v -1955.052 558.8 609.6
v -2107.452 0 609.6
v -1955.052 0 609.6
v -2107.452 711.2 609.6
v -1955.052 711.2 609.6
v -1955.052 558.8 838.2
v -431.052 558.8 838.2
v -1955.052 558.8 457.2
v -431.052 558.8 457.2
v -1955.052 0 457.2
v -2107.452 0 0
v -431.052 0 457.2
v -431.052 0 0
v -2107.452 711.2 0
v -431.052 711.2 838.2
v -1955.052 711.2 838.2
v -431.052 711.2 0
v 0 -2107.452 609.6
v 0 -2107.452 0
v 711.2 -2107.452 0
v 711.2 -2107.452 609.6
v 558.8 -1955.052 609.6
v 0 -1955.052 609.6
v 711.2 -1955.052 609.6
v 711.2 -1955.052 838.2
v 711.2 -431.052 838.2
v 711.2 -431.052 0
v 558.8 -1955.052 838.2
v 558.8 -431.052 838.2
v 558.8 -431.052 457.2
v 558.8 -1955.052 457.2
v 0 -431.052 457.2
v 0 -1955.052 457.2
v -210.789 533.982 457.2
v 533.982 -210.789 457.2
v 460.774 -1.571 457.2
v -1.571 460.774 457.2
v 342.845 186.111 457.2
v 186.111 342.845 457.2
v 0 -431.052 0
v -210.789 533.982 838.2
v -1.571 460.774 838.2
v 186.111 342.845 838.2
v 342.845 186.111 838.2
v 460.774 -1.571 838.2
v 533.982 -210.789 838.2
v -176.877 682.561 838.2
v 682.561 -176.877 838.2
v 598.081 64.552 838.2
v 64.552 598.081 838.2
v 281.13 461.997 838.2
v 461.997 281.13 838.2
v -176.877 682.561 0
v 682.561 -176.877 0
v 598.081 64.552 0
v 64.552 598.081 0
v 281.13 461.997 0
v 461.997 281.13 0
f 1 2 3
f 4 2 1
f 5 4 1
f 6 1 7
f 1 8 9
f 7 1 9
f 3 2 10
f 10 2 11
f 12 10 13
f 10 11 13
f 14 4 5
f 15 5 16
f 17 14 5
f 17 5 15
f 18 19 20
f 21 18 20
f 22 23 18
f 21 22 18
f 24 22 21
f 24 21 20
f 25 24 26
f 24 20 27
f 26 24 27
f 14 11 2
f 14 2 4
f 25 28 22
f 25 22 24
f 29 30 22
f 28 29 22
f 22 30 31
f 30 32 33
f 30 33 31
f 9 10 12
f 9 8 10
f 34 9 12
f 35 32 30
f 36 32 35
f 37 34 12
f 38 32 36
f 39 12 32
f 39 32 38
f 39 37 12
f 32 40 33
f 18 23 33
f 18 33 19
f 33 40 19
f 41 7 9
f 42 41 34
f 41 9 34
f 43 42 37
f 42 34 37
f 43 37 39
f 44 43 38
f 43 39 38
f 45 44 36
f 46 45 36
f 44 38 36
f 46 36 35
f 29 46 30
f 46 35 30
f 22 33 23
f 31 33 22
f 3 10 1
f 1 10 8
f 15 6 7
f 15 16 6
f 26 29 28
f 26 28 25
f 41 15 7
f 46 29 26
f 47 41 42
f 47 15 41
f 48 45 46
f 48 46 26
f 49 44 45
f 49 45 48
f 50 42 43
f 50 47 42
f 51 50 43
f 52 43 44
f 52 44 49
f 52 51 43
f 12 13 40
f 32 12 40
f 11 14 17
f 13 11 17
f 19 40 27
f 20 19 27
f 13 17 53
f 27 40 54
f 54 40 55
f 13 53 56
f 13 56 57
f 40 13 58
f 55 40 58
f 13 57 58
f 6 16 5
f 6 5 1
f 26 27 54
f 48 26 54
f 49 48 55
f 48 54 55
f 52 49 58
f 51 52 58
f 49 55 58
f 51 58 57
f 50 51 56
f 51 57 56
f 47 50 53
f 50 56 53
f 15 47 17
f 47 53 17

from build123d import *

# Parameters (mm, degrees)
F1_DEPTH = 457.2
F3_DEPTH = 838.2
F4_W     = 152.4
F4_H     = 711.2
F4_W_2   = 711.2
F4_H_2   = 152.4
F5_DEPTH = 609.6


with BuildPart() as f1:
    # F0 (on Top) → F1 (new body)
    with BuildSketch(Plane.XY):
        with BuildLine():
            Line((-1955.052294, 0), (-431.052294, 0))
            Line((-431.052294, 0), (0, -431.052294))
            Line((0, -431.052294), (0, -1955.052294))
            Line((0, -1955.052294), (558.8, -1955.052294))
            Line((558.8, -1955.052294), (558.8, -431.052294))
            ThreePointArc((558.8, -431.052294), (268.878976, 268.878976), (-431.052294, 558.8))
            Line((-431.052294, 558.8), (-1955.052294, 558.8))
            Line((-1955.052294, 558.8), (-1955.052294, 0))
        make_face()
    extrude(amount=F1_DEPTH)

    # F2 (on Top) → F3 (join)
    with BuildSketch(Plane.XY):
        with BuildLine():
            Line((-1955.052294, 558.8), (-431.052294, 558.8))
            ThreePointArc((-431.052294, 558.8), (268.878976, 268.878976), (558.8, -431.052294))
            Line((558.8, -431.052294), (558.8, -1955.052294))
            Line((558.8, -1955.052294), (711.2, -1955.052294))
            Line((711.2, -1955.052294), (711.2, -431.052294))
            ThreePointArc((711.2, -431.052294), (376.642049, 376.642049), (-431.052294, 711.2))
            Line((-431.052294, 711.2), (-1955.052294, 711.2))
            Line((-1955.052294, 711.2), (-1955.052294, 558.8))
        make_face()
    extrude(amount=F3_DEPTH)

    # F4 (on Top) → F5 (join)
    with BuildSketch(Plane.XY):
        with Locations((-2031.252294, 355.6)):
            Rectangle(F4_W, F4_H)
        with Locations((355.6, -2031.252294)):
            Rectangle(F4_W_2, F4_H_2)
    extrude(amount=F5_DEPTH)


solid = f1.part
